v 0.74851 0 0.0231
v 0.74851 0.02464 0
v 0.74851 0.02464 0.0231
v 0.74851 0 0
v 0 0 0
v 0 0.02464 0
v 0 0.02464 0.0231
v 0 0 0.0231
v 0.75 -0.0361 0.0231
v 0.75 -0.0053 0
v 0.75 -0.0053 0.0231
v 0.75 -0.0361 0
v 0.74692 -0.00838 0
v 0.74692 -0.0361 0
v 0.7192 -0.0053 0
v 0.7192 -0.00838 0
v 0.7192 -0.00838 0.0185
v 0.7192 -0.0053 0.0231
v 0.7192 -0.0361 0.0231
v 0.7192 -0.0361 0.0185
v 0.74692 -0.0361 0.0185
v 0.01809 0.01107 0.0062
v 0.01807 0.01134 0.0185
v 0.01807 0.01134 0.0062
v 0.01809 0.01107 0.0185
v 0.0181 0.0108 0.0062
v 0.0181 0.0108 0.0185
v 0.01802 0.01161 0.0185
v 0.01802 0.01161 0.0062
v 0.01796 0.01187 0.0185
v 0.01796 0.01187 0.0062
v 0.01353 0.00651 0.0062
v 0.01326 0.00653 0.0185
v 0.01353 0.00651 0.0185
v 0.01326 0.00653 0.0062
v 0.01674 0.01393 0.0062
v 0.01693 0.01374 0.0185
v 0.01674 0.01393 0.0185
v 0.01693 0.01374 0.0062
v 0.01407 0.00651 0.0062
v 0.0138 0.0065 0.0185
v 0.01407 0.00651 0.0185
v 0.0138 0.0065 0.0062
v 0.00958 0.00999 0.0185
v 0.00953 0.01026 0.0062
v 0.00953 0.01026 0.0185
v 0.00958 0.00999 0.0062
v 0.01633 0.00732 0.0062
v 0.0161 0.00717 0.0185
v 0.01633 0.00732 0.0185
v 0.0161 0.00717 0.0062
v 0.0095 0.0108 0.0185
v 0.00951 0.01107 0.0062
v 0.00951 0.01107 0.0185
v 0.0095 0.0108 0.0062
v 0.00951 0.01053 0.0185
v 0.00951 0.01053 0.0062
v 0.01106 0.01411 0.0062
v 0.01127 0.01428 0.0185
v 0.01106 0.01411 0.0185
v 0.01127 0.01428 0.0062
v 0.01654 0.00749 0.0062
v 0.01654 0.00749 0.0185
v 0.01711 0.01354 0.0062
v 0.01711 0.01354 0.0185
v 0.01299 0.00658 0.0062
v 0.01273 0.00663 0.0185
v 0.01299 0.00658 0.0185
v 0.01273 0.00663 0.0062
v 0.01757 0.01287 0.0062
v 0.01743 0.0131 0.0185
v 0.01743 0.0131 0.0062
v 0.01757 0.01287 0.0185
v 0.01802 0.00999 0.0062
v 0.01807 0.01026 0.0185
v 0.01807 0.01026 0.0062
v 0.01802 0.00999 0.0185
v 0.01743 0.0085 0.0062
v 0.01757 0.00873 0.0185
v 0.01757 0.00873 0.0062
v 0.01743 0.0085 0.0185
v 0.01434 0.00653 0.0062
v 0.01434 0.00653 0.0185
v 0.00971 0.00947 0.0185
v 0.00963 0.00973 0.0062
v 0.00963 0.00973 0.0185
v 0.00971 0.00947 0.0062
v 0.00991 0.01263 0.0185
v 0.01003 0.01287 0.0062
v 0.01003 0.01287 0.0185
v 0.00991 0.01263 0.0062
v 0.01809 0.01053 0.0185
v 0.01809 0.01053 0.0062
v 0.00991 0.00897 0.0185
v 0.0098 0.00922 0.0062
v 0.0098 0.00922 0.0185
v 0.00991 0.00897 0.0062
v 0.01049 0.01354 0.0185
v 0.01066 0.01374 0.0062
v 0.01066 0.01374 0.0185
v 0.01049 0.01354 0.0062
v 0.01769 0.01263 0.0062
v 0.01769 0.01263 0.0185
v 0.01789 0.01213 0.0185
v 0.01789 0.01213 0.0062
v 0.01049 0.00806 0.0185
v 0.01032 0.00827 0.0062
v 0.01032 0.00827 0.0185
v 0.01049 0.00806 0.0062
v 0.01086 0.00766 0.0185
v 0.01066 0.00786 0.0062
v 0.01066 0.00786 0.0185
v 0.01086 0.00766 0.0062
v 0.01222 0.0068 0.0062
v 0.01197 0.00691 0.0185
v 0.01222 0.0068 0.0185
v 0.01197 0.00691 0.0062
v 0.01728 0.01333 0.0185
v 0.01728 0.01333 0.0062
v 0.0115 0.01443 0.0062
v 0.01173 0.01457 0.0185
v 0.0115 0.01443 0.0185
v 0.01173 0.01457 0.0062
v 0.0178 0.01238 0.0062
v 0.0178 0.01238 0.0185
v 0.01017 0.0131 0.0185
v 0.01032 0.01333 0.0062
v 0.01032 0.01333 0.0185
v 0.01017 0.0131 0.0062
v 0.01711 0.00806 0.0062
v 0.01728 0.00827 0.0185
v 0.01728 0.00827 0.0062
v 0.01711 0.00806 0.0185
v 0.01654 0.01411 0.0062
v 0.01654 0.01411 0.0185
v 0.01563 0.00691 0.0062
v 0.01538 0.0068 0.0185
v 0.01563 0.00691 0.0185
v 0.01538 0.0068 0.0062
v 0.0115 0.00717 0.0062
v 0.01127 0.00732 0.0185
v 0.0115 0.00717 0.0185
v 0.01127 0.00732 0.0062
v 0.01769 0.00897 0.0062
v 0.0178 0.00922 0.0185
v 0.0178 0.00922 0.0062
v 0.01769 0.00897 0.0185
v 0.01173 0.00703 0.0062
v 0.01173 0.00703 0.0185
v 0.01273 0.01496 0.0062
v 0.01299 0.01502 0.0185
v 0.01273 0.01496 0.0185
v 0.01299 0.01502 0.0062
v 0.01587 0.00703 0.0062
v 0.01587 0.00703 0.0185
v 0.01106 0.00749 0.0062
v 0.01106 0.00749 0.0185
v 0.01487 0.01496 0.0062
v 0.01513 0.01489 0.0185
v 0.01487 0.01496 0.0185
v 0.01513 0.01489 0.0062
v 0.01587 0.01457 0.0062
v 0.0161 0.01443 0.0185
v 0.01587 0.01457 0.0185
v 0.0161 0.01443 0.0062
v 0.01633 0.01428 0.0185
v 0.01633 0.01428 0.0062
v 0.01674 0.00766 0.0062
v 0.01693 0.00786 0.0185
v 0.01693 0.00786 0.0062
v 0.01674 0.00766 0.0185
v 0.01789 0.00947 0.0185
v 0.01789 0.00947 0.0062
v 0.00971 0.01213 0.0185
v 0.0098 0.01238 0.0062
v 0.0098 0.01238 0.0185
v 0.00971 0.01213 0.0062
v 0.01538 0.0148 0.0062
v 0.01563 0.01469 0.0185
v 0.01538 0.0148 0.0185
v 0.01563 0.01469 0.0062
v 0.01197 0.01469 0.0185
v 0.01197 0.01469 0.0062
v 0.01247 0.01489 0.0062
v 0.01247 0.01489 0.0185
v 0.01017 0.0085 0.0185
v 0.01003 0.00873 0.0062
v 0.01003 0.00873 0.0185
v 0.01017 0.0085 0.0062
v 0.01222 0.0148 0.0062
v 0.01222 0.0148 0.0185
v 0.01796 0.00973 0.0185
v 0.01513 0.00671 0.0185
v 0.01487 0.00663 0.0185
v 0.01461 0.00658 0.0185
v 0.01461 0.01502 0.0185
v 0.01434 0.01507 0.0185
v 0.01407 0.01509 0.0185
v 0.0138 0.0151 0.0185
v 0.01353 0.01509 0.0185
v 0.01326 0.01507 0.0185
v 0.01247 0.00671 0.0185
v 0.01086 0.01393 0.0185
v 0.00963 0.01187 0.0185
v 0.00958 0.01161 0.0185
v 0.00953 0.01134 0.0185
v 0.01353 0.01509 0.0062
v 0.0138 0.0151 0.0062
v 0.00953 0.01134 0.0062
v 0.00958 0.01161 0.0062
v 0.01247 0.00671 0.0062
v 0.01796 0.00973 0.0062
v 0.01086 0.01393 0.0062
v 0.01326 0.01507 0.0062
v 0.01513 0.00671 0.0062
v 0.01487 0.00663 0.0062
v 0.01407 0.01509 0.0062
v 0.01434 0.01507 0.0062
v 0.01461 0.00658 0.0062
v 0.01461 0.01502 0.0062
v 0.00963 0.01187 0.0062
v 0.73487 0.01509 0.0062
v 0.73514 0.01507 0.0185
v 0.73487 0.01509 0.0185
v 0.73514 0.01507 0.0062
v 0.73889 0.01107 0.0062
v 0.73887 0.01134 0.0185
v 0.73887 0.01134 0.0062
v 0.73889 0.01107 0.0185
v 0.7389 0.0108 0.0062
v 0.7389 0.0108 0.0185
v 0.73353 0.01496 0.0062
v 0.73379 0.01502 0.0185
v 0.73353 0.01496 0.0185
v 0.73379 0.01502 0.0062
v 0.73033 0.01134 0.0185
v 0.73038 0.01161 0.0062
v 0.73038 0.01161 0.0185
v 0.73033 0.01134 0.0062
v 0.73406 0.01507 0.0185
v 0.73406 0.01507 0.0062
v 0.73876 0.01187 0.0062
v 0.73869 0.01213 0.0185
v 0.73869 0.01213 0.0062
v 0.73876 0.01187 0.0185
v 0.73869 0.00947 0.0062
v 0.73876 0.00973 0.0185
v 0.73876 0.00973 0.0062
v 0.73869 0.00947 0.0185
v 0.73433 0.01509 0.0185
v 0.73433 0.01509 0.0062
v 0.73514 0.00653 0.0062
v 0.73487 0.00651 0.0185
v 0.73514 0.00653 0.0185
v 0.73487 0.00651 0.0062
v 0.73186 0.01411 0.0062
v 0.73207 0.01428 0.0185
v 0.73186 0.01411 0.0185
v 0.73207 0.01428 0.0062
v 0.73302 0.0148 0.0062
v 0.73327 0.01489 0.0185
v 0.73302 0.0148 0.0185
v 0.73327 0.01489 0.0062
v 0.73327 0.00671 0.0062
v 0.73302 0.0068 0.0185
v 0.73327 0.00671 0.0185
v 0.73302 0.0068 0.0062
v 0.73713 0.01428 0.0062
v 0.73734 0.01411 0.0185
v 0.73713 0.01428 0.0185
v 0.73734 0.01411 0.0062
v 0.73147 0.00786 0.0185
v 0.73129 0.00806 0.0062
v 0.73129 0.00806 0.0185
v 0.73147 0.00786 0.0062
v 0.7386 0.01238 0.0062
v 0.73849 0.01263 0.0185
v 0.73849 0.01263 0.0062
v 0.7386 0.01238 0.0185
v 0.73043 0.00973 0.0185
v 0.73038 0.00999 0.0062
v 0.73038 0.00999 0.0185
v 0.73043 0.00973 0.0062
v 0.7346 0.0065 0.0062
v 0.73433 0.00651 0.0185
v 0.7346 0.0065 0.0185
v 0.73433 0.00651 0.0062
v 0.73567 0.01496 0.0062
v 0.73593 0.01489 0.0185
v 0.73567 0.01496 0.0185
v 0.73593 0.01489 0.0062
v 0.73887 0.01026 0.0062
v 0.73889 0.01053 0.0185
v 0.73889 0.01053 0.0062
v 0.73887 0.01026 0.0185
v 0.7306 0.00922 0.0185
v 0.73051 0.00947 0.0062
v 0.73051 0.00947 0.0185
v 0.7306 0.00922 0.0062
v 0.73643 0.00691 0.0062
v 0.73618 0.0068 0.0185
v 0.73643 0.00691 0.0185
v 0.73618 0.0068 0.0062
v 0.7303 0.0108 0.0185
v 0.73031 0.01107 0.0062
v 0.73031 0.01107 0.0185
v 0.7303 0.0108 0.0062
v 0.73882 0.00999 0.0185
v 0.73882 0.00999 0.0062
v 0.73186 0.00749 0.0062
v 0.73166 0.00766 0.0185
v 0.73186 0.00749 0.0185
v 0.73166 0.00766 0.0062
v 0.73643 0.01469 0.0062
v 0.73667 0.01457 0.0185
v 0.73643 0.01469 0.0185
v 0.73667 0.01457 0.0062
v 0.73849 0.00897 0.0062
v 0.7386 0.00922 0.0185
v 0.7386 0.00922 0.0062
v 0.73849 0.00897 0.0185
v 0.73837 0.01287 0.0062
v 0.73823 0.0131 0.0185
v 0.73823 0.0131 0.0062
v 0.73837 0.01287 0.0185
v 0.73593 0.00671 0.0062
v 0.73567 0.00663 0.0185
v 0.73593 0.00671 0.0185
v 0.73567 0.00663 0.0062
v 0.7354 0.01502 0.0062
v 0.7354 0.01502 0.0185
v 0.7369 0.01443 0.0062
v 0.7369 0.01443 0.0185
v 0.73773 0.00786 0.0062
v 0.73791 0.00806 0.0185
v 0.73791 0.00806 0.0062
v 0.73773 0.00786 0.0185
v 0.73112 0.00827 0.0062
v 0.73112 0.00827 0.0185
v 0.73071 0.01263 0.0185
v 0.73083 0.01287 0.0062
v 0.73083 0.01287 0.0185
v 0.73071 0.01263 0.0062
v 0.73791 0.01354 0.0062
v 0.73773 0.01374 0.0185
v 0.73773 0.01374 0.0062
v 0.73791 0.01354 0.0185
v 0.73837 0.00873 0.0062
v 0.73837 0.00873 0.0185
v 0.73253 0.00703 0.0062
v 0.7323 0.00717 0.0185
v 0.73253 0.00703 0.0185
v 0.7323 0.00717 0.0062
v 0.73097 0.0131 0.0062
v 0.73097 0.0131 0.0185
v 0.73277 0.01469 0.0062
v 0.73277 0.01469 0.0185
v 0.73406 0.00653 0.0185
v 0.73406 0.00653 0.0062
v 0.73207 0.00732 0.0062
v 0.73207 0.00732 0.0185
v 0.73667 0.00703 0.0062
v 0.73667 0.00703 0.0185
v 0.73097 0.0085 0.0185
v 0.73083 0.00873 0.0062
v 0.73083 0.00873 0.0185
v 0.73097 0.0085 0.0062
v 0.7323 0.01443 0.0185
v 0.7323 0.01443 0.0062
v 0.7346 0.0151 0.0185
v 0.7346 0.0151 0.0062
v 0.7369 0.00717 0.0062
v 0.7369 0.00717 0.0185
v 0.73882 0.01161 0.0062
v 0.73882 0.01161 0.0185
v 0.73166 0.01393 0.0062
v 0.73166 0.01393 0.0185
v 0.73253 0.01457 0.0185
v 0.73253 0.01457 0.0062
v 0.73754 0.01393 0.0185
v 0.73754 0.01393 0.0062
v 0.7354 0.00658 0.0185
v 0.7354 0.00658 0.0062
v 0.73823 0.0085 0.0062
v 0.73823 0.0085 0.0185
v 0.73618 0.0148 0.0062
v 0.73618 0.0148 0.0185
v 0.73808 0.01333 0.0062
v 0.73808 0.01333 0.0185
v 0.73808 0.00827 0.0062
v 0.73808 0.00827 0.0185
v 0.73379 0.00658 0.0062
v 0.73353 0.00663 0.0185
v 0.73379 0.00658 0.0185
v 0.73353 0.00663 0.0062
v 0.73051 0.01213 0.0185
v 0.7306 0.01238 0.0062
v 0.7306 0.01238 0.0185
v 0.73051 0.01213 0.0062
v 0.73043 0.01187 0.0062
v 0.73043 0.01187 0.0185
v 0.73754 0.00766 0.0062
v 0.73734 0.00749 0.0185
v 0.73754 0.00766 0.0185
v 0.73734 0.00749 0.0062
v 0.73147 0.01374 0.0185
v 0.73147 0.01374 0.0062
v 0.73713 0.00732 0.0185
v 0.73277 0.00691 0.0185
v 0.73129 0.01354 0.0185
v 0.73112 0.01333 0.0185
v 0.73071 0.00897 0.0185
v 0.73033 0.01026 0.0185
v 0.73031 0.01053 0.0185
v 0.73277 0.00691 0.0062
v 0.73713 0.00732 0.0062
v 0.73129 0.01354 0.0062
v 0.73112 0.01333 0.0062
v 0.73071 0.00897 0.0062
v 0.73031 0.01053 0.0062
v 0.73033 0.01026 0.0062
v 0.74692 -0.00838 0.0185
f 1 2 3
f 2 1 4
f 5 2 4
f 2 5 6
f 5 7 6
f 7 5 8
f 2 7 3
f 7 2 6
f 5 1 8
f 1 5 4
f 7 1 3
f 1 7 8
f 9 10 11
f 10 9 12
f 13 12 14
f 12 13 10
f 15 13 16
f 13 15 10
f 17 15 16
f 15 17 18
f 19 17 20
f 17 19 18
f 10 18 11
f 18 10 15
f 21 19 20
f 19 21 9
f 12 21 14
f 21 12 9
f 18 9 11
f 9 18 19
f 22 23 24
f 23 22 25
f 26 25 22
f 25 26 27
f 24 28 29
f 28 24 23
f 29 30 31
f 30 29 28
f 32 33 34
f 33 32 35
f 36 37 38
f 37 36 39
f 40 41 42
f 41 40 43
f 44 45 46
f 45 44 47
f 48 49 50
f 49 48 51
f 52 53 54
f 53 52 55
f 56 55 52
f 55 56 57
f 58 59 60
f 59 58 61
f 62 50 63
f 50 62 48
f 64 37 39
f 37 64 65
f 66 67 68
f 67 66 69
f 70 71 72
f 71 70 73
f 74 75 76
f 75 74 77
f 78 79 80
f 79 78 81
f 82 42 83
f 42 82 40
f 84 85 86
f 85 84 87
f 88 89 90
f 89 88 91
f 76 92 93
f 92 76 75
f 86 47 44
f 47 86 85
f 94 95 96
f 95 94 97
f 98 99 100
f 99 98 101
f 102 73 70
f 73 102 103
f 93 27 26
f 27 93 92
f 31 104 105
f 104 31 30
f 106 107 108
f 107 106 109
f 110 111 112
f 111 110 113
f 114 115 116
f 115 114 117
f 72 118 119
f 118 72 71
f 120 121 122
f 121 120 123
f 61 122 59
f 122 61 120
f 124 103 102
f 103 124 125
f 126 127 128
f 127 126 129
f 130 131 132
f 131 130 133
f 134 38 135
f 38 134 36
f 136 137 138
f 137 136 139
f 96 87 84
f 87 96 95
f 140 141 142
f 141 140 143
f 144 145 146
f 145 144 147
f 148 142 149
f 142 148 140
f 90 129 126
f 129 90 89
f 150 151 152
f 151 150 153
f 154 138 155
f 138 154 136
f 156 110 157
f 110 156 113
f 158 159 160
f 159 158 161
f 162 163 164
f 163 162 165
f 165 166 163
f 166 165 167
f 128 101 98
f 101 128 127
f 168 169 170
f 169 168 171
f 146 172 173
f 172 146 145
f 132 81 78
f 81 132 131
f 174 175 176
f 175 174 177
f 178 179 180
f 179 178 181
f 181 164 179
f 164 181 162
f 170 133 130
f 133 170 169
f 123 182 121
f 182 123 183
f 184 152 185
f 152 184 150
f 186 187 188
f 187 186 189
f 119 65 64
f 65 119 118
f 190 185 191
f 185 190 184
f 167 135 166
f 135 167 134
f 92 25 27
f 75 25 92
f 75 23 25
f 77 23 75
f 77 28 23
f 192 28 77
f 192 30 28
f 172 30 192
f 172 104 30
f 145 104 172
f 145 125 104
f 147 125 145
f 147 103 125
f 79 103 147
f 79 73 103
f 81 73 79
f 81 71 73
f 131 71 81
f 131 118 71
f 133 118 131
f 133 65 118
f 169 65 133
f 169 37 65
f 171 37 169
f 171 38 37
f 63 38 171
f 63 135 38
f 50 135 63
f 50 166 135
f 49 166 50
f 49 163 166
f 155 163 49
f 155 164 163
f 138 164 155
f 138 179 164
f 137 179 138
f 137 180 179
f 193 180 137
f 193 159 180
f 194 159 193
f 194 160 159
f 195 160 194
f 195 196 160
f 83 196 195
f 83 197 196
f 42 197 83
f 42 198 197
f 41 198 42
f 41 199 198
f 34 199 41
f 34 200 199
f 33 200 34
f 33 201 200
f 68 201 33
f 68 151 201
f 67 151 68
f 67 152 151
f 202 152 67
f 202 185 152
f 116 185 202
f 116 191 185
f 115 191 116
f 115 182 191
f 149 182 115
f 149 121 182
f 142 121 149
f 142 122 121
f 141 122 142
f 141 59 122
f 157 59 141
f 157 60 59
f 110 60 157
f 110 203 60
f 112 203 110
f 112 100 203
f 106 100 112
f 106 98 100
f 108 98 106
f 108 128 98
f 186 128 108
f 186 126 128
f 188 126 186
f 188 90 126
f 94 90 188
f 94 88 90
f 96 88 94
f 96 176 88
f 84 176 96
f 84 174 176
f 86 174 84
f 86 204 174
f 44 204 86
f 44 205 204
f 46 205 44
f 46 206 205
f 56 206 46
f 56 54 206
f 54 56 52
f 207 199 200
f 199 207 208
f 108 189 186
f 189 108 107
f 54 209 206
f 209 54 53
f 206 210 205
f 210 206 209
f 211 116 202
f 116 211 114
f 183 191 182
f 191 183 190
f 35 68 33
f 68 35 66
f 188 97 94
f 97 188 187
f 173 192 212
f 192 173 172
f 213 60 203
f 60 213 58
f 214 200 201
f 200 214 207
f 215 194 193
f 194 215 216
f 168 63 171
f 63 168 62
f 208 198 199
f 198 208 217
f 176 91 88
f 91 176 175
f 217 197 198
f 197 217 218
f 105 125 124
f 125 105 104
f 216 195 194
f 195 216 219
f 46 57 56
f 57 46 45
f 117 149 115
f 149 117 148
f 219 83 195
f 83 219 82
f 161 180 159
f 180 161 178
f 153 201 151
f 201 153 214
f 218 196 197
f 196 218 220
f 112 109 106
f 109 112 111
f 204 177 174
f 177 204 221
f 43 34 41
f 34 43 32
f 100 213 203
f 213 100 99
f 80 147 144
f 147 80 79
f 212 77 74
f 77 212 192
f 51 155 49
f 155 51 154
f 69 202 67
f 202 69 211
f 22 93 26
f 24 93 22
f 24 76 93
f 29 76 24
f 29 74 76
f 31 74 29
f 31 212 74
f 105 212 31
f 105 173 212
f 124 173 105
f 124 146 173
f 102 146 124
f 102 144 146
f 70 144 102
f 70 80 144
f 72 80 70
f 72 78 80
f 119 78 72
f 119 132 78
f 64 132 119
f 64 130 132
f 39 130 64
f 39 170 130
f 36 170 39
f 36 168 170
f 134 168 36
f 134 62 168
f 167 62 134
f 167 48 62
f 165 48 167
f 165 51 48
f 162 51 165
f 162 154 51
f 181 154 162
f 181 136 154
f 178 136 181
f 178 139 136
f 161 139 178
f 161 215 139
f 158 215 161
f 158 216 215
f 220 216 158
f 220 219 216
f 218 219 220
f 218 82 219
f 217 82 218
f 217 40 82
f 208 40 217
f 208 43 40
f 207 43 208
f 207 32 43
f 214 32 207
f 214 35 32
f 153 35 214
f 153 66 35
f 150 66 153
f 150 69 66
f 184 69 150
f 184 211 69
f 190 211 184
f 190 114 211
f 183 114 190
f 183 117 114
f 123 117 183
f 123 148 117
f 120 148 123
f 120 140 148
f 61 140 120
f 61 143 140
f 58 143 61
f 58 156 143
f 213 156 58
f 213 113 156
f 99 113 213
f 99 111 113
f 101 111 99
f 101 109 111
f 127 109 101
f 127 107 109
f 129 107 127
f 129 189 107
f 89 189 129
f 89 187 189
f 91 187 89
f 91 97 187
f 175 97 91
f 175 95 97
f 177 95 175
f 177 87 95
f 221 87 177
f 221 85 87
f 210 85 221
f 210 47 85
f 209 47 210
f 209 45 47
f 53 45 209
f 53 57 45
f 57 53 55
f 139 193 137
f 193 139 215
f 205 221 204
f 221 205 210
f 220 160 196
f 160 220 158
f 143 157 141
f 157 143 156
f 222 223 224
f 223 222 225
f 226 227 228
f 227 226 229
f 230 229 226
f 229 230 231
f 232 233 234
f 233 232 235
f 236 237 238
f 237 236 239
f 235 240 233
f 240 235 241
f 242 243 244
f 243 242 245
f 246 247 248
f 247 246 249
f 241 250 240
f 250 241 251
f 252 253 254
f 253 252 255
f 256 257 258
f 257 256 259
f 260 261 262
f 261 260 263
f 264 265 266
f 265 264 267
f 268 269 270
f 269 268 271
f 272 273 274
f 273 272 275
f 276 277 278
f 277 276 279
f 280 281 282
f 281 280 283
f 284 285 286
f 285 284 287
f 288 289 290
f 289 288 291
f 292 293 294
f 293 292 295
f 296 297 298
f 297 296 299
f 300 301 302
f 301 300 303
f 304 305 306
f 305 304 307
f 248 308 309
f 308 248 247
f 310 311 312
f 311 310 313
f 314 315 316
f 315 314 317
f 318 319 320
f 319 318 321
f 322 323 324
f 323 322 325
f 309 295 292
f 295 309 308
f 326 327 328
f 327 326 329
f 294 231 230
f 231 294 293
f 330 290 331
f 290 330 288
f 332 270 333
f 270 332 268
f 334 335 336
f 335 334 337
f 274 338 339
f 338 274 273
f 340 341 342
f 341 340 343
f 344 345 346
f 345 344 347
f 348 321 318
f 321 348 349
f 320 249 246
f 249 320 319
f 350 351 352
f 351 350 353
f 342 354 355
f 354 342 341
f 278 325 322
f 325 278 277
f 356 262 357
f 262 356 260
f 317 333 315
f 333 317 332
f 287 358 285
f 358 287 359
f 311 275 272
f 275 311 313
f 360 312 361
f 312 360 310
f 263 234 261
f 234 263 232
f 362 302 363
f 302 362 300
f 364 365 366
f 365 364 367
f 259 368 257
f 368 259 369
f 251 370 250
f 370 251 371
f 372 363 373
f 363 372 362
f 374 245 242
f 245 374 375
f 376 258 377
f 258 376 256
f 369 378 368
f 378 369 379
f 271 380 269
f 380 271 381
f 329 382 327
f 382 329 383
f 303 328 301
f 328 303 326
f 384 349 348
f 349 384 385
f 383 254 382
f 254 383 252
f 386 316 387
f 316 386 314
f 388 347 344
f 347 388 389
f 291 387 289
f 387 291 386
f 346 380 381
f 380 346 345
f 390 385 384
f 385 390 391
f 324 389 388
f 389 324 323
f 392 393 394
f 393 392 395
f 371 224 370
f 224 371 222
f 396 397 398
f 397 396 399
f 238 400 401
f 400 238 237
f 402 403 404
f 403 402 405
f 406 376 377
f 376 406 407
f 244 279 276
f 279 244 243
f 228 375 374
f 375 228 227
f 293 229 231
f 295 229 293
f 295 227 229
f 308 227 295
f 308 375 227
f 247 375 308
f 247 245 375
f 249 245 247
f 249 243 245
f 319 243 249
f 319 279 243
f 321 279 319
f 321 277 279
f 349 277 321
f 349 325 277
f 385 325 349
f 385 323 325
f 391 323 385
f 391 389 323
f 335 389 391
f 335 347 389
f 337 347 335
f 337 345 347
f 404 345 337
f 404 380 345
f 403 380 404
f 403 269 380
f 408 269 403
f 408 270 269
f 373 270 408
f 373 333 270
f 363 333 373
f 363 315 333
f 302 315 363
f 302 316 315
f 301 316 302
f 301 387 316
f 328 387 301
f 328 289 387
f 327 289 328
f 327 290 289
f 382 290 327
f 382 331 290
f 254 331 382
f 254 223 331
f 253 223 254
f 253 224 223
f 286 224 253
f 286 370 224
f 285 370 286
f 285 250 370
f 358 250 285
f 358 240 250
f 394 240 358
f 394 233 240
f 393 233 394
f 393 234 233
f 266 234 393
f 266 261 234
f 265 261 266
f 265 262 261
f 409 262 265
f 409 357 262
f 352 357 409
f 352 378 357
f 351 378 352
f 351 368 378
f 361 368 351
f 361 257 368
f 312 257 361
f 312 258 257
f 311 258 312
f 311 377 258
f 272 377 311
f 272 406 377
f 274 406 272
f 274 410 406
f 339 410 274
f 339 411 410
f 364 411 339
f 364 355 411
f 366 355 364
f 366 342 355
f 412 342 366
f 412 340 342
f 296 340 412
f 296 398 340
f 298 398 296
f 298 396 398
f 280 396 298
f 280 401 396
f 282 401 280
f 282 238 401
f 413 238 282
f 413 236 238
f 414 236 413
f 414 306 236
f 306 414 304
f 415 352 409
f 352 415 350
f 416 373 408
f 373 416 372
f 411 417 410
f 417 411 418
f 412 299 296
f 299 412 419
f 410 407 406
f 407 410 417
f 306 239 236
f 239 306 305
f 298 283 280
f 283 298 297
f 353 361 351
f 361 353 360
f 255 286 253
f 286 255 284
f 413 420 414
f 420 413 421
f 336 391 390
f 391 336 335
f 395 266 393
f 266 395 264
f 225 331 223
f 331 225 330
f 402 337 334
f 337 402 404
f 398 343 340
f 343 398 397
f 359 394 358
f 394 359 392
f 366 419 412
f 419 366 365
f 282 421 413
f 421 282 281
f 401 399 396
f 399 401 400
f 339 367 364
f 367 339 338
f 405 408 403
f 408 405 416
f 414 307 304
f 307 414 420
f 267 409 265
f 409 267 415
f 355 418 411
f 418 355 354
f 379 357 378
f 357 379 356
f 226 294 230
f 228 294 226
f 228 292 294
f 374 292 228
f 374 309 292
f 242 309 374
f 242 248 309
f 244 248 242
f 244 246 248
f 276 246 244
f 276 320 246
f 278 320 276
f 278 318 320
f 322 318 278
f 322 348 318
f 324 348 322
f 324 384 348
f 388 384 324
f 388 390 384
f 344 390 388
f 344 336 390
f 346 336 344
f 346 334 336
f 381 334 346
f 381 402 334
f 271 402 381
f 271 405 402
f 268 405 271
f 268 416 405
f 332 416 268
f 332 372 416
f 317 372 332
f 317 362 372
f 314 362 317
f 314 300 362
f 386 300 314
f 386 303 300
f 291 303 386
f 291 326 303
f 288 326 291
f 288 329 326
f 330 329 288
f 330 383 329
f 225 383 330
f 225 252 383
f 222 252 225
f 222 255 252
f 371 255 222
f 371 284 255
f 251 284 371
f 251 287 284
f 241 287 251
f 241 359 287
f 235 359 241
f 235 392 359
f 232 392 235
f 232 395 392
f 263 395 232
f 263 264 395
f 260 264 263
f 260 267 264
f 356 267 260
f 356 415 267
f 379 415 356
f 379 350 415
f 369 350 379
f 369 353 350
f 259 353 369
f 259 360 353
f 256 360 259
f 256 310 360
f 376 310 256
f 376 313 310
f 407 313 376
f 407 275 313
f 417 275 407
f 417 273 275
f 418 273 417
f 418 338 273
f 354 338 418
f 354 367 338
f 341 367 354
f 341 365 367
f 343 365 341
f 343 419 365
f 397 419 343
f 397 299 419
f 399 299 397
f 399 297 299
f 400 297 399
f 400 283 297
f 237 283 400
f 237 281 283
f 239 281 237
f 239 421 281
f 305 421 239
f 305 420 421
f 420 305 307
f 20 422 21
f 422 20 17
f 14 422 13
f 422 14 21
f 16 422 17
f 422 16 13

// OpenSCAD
// Parameters
length_rail = 0.748506;
width_rail = 0.024642;
height_rail_lower = 0.018482;
extrusion_depth_lower = 0.0185;

thickness_top = 0.00462;
extrusion_depth_top = 0.0046;

radius_recess = 0.0043;
center_offset_front = 0.0108;
centers_from_left = [0.0138, 0.7346];
recess_band_start = 0.0062;
recess_band_end = 0.0185;
recess_depth = 0.0123;

size_end_block = 0.030803;
height_end_block_lower = 0.018482;
extrusion_depth_end_block = 0.0185;
left_edge_end_block = 0.7192;
right_edge_offset = 0.0015;
front_edge_offset = 0.0361;
back_edge_offset = 0.0299;

radius_recess_end = 0.0043;
center_X_end = 0.7361;
center_Y_end = 0.0192;

size_cutout = 0.027722;
cutout_start_z = 0.0185;
cutout_end_z = -0.0585;
total_cutout_depth = 0.077;

$fn = 100;

// Helper module for cylindrical recess
module cylindrical_recess(radius, center_xy, band_start, band_end, depth) {
    translate([center_xy[0], center_xy[1], band_start])
        cylinder(h = band_end - band_start, r = radius);
}

// Main rail with top layer
module main_rail() {
    // Lower body
    translate([0, 0, 0])
        cube([length_rail, width_rail, height_rail_lower]);
    
    // Top layer
    translate([0, 0, height_rail_lower])
        cube([length_rail, width_rail, thickness_top]);
}

// End block with top layer
module end_block() {
    // Calculate end block position
    x_pos = left_edge_end_block;
    y_pos = -front_edge_offset;
    z_pos = 0;
    
    // Lower body
    translate([x_pos, y_pos, z_pos])
        cube([size_end_block, size_end_block, height_end_block_lower]);
    
    // Top layer
    translate([x_pos, y_pos, height_end_block_lower])
        cube([size_end_block, size_end_block, thickness_top]);
}

// Final model
difference() {
    // Combine main rail and end block
    union() {
        main_rail();
        end_block();
    }
    
    // Cut recesses in main rail
    for (center_x = centers_from_left) {
        cylindrical_recess(
            radius_recess,
            [center_x, center_offset_front],
            recess_band_start,
            recess_band_end,
            recess_depth
        );
    }
    
    // Cut recess in end block
    translate([center_X_end, -center_Y_end, 0])
        cylindrical_recess(
            radius_recess_end,
            [0, 0],
            recess_band_start,
            recess_band_end,
            recess_depth
        );
    
    // Cut rectangular cutout in end block
    translate([left_edge_end_block, -front_edge_offset, cutout_end_z])
        cube([size_cutout, size_cutout, total_cutout_depth]);
}
